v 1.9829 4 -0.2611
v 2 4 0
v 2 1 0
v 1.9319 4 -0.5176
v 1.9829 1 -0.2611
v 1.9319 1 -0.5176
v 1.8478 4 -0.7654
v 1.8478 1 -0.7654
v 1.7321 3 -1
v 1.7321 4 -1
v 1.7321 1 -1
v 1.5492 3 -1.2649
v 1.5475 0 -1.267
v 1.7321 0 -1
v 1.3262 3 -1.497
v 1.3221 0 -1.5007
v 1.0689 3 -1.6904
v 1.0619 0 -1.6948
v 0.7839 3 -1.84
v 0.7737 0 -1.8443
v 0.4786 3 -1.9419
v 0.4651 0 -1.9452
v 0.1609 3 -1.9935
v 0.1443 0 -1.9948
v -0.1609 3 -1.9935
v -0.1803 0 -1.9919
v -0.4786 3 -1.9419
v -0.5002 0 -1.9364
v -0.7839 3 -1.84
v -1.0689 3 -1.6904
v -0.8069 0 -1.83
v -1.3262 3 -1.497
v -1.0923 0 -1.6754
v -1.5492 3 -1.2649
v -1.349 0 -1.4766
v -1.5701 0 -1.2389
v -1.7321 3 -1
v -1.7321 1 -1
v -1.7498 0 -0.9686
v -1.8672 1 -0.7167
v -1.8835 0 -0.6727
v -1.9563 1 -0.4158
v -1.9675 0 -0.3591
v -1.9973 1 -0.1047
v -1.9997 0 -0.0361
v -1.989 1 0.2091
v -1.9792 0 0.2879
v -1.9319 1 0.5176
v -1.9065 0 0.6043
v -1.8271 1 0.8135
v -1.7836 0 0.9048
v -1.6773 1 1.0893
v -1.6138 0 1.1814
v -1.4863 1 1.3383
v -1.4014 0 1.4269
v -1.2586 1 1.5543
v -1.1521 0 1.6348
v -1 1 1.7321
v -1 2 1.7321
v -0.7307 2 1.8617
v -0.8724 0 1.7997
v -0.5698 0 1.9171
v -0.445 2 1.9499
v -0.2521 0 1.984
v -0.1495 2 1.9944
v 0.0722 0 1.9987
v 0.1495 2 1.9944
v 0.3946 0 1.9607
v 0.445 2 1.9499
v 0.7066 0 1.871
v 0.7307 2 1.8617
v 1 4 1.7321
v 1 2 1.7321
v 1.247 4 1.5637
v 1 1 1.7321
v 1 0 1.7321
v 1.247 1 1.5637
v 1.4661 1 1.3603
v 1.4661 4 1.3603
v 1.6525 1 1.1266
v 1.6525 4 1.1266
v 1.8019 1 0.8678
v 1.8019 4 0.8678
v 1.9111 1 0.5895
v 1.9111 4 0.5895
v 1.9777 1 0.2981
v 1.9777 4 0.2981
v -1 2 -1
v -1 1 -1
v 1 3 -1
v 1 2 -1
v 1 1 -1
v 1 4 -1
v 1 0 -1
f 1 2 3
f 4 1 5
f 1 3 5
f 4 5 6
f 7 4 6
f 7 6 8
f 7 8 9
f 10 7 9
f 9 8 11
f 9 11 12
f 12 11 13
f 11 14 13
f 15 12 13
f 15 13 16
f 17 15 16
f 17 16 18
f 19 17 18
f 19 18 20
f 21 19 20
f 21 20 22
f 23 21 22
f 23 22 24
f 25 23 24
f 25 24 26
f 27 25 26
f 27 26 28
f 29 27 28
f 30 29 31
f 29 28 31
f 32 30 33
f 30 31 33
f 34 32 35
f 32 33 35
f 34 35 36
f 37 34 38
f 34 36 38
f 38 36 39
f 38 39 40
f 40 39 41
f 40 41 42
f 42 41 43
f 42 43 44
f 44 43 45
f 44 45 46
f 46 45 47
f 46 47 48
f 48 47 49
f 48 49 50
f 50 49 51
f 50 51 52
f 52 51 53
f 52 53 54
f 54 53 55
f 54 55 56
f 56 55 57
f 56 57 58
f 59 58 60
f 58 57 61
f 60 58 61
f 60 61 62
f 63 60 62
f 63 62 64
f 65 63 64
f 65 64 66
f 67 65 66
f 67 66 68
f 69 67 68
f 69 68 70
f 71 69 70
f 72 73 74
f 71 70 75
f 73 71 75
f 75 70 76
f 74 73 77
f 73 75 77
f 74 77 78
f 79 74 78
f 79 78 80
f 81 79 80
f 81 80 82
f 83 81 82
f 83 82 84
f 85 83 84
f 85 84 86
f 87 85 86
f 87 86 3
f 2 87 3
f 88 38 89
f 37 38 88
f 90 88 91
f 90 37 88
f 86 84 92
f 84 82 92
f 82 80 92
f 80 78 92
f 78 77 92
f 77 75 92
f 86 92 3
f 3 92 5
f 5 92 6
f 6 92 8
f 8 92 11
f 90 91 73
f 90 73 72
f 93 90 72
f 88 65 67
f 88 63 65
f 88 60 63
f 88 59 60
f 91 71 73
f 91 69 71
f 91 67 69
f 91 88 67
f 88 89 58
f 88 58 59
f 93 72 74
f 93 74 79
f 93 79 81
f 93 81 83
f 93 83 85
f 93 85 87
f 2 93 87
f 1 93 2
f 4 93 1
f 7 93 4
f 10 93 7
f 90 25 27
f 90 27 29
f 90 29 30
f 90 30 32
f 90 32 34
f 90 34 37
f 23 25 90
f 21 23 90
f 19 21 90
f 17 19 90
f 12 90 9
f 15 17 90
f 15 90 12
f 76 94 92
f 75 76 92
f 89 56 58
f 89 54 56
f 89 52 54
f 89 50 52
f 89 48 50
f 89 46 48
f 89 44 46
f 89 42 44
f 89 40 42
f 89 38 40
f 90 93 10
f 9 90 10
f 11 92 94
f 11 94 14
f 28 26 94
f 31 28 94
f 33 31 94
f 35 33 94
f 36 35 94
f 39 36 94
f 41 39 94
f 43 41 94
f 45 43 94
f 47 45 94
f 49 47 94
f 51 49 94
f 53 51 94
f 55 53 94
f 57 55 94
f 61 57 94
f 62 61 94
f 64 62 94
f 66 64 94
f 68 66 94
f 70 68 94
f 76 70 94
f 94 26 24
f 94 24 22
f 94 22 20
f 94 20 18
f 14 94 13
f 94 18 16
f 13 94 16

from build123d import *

# Parameters (mm, degrees)
SKETCH1_R               = 2
BOSS_EXTRUDE1_DEPTH     = 4
SKETCH2_W               = 1
SKETCH2_H               = 1
CUT_EXTRUDE1_DEPTH      = 3
CUT_EXTRUDE1_DEPTH_BACK = 1
CUT_EXTRUDE4_DEPTH      = 1


with BuildPart() as part:
    # Sketch1 → Boss-Extrude1 (new body)
    with BuildSketch(Plane(origin=(0, 0, 0), x_dir=(1, 0, 0), z_dir=(0, 1, 0))):
        Circle(SKETCH1_R)
    extrude(amount=BOSS_EXTRUDE1_DEPTH)

    # Sketch2 → Cut-Extrude1 (cut, two sides)
    with BuildSketch(Plane.XY) as cut_extrude1_sk:
        Polygon((1, 2), (1, 3), (1, 4), (-2, 4), (-2, 3), (-2, 1), (-1, 1), (-1, 2), align=None)
        with Locations((1.5, 0.5)):
            Rectangle(SKETCH2_W, SKETCH2_H)
    extrude(amount=CUT_EXTRUDE1_DEPTH, mode=Mode.SUBTRACT)
    extrude(cut_extrude1_sk.sketch, amount=-CUT_EXTRUDE1_DEPTH_BACK, mode=Mode.SUBTRACT)

    # Sketch5 → Cut-Extrude4 (cut)
    with BuildSketch(Plane(origin=(0, 4, 0), x_dir=(1, 0, 0), z_dir=(0, 1, 0))):
        with BuildLine():
            Line((-1.732050808, 1), (1.732050808, 1))
            ThreePointArc((1.732050808, 1), (0, 2), (-1.732050808, 1))
        make_face()
    extrude(amount=-CUT_EXTRUDE4_DEPTH, mode=Mode.SUBTRACT)


solid = part.part
